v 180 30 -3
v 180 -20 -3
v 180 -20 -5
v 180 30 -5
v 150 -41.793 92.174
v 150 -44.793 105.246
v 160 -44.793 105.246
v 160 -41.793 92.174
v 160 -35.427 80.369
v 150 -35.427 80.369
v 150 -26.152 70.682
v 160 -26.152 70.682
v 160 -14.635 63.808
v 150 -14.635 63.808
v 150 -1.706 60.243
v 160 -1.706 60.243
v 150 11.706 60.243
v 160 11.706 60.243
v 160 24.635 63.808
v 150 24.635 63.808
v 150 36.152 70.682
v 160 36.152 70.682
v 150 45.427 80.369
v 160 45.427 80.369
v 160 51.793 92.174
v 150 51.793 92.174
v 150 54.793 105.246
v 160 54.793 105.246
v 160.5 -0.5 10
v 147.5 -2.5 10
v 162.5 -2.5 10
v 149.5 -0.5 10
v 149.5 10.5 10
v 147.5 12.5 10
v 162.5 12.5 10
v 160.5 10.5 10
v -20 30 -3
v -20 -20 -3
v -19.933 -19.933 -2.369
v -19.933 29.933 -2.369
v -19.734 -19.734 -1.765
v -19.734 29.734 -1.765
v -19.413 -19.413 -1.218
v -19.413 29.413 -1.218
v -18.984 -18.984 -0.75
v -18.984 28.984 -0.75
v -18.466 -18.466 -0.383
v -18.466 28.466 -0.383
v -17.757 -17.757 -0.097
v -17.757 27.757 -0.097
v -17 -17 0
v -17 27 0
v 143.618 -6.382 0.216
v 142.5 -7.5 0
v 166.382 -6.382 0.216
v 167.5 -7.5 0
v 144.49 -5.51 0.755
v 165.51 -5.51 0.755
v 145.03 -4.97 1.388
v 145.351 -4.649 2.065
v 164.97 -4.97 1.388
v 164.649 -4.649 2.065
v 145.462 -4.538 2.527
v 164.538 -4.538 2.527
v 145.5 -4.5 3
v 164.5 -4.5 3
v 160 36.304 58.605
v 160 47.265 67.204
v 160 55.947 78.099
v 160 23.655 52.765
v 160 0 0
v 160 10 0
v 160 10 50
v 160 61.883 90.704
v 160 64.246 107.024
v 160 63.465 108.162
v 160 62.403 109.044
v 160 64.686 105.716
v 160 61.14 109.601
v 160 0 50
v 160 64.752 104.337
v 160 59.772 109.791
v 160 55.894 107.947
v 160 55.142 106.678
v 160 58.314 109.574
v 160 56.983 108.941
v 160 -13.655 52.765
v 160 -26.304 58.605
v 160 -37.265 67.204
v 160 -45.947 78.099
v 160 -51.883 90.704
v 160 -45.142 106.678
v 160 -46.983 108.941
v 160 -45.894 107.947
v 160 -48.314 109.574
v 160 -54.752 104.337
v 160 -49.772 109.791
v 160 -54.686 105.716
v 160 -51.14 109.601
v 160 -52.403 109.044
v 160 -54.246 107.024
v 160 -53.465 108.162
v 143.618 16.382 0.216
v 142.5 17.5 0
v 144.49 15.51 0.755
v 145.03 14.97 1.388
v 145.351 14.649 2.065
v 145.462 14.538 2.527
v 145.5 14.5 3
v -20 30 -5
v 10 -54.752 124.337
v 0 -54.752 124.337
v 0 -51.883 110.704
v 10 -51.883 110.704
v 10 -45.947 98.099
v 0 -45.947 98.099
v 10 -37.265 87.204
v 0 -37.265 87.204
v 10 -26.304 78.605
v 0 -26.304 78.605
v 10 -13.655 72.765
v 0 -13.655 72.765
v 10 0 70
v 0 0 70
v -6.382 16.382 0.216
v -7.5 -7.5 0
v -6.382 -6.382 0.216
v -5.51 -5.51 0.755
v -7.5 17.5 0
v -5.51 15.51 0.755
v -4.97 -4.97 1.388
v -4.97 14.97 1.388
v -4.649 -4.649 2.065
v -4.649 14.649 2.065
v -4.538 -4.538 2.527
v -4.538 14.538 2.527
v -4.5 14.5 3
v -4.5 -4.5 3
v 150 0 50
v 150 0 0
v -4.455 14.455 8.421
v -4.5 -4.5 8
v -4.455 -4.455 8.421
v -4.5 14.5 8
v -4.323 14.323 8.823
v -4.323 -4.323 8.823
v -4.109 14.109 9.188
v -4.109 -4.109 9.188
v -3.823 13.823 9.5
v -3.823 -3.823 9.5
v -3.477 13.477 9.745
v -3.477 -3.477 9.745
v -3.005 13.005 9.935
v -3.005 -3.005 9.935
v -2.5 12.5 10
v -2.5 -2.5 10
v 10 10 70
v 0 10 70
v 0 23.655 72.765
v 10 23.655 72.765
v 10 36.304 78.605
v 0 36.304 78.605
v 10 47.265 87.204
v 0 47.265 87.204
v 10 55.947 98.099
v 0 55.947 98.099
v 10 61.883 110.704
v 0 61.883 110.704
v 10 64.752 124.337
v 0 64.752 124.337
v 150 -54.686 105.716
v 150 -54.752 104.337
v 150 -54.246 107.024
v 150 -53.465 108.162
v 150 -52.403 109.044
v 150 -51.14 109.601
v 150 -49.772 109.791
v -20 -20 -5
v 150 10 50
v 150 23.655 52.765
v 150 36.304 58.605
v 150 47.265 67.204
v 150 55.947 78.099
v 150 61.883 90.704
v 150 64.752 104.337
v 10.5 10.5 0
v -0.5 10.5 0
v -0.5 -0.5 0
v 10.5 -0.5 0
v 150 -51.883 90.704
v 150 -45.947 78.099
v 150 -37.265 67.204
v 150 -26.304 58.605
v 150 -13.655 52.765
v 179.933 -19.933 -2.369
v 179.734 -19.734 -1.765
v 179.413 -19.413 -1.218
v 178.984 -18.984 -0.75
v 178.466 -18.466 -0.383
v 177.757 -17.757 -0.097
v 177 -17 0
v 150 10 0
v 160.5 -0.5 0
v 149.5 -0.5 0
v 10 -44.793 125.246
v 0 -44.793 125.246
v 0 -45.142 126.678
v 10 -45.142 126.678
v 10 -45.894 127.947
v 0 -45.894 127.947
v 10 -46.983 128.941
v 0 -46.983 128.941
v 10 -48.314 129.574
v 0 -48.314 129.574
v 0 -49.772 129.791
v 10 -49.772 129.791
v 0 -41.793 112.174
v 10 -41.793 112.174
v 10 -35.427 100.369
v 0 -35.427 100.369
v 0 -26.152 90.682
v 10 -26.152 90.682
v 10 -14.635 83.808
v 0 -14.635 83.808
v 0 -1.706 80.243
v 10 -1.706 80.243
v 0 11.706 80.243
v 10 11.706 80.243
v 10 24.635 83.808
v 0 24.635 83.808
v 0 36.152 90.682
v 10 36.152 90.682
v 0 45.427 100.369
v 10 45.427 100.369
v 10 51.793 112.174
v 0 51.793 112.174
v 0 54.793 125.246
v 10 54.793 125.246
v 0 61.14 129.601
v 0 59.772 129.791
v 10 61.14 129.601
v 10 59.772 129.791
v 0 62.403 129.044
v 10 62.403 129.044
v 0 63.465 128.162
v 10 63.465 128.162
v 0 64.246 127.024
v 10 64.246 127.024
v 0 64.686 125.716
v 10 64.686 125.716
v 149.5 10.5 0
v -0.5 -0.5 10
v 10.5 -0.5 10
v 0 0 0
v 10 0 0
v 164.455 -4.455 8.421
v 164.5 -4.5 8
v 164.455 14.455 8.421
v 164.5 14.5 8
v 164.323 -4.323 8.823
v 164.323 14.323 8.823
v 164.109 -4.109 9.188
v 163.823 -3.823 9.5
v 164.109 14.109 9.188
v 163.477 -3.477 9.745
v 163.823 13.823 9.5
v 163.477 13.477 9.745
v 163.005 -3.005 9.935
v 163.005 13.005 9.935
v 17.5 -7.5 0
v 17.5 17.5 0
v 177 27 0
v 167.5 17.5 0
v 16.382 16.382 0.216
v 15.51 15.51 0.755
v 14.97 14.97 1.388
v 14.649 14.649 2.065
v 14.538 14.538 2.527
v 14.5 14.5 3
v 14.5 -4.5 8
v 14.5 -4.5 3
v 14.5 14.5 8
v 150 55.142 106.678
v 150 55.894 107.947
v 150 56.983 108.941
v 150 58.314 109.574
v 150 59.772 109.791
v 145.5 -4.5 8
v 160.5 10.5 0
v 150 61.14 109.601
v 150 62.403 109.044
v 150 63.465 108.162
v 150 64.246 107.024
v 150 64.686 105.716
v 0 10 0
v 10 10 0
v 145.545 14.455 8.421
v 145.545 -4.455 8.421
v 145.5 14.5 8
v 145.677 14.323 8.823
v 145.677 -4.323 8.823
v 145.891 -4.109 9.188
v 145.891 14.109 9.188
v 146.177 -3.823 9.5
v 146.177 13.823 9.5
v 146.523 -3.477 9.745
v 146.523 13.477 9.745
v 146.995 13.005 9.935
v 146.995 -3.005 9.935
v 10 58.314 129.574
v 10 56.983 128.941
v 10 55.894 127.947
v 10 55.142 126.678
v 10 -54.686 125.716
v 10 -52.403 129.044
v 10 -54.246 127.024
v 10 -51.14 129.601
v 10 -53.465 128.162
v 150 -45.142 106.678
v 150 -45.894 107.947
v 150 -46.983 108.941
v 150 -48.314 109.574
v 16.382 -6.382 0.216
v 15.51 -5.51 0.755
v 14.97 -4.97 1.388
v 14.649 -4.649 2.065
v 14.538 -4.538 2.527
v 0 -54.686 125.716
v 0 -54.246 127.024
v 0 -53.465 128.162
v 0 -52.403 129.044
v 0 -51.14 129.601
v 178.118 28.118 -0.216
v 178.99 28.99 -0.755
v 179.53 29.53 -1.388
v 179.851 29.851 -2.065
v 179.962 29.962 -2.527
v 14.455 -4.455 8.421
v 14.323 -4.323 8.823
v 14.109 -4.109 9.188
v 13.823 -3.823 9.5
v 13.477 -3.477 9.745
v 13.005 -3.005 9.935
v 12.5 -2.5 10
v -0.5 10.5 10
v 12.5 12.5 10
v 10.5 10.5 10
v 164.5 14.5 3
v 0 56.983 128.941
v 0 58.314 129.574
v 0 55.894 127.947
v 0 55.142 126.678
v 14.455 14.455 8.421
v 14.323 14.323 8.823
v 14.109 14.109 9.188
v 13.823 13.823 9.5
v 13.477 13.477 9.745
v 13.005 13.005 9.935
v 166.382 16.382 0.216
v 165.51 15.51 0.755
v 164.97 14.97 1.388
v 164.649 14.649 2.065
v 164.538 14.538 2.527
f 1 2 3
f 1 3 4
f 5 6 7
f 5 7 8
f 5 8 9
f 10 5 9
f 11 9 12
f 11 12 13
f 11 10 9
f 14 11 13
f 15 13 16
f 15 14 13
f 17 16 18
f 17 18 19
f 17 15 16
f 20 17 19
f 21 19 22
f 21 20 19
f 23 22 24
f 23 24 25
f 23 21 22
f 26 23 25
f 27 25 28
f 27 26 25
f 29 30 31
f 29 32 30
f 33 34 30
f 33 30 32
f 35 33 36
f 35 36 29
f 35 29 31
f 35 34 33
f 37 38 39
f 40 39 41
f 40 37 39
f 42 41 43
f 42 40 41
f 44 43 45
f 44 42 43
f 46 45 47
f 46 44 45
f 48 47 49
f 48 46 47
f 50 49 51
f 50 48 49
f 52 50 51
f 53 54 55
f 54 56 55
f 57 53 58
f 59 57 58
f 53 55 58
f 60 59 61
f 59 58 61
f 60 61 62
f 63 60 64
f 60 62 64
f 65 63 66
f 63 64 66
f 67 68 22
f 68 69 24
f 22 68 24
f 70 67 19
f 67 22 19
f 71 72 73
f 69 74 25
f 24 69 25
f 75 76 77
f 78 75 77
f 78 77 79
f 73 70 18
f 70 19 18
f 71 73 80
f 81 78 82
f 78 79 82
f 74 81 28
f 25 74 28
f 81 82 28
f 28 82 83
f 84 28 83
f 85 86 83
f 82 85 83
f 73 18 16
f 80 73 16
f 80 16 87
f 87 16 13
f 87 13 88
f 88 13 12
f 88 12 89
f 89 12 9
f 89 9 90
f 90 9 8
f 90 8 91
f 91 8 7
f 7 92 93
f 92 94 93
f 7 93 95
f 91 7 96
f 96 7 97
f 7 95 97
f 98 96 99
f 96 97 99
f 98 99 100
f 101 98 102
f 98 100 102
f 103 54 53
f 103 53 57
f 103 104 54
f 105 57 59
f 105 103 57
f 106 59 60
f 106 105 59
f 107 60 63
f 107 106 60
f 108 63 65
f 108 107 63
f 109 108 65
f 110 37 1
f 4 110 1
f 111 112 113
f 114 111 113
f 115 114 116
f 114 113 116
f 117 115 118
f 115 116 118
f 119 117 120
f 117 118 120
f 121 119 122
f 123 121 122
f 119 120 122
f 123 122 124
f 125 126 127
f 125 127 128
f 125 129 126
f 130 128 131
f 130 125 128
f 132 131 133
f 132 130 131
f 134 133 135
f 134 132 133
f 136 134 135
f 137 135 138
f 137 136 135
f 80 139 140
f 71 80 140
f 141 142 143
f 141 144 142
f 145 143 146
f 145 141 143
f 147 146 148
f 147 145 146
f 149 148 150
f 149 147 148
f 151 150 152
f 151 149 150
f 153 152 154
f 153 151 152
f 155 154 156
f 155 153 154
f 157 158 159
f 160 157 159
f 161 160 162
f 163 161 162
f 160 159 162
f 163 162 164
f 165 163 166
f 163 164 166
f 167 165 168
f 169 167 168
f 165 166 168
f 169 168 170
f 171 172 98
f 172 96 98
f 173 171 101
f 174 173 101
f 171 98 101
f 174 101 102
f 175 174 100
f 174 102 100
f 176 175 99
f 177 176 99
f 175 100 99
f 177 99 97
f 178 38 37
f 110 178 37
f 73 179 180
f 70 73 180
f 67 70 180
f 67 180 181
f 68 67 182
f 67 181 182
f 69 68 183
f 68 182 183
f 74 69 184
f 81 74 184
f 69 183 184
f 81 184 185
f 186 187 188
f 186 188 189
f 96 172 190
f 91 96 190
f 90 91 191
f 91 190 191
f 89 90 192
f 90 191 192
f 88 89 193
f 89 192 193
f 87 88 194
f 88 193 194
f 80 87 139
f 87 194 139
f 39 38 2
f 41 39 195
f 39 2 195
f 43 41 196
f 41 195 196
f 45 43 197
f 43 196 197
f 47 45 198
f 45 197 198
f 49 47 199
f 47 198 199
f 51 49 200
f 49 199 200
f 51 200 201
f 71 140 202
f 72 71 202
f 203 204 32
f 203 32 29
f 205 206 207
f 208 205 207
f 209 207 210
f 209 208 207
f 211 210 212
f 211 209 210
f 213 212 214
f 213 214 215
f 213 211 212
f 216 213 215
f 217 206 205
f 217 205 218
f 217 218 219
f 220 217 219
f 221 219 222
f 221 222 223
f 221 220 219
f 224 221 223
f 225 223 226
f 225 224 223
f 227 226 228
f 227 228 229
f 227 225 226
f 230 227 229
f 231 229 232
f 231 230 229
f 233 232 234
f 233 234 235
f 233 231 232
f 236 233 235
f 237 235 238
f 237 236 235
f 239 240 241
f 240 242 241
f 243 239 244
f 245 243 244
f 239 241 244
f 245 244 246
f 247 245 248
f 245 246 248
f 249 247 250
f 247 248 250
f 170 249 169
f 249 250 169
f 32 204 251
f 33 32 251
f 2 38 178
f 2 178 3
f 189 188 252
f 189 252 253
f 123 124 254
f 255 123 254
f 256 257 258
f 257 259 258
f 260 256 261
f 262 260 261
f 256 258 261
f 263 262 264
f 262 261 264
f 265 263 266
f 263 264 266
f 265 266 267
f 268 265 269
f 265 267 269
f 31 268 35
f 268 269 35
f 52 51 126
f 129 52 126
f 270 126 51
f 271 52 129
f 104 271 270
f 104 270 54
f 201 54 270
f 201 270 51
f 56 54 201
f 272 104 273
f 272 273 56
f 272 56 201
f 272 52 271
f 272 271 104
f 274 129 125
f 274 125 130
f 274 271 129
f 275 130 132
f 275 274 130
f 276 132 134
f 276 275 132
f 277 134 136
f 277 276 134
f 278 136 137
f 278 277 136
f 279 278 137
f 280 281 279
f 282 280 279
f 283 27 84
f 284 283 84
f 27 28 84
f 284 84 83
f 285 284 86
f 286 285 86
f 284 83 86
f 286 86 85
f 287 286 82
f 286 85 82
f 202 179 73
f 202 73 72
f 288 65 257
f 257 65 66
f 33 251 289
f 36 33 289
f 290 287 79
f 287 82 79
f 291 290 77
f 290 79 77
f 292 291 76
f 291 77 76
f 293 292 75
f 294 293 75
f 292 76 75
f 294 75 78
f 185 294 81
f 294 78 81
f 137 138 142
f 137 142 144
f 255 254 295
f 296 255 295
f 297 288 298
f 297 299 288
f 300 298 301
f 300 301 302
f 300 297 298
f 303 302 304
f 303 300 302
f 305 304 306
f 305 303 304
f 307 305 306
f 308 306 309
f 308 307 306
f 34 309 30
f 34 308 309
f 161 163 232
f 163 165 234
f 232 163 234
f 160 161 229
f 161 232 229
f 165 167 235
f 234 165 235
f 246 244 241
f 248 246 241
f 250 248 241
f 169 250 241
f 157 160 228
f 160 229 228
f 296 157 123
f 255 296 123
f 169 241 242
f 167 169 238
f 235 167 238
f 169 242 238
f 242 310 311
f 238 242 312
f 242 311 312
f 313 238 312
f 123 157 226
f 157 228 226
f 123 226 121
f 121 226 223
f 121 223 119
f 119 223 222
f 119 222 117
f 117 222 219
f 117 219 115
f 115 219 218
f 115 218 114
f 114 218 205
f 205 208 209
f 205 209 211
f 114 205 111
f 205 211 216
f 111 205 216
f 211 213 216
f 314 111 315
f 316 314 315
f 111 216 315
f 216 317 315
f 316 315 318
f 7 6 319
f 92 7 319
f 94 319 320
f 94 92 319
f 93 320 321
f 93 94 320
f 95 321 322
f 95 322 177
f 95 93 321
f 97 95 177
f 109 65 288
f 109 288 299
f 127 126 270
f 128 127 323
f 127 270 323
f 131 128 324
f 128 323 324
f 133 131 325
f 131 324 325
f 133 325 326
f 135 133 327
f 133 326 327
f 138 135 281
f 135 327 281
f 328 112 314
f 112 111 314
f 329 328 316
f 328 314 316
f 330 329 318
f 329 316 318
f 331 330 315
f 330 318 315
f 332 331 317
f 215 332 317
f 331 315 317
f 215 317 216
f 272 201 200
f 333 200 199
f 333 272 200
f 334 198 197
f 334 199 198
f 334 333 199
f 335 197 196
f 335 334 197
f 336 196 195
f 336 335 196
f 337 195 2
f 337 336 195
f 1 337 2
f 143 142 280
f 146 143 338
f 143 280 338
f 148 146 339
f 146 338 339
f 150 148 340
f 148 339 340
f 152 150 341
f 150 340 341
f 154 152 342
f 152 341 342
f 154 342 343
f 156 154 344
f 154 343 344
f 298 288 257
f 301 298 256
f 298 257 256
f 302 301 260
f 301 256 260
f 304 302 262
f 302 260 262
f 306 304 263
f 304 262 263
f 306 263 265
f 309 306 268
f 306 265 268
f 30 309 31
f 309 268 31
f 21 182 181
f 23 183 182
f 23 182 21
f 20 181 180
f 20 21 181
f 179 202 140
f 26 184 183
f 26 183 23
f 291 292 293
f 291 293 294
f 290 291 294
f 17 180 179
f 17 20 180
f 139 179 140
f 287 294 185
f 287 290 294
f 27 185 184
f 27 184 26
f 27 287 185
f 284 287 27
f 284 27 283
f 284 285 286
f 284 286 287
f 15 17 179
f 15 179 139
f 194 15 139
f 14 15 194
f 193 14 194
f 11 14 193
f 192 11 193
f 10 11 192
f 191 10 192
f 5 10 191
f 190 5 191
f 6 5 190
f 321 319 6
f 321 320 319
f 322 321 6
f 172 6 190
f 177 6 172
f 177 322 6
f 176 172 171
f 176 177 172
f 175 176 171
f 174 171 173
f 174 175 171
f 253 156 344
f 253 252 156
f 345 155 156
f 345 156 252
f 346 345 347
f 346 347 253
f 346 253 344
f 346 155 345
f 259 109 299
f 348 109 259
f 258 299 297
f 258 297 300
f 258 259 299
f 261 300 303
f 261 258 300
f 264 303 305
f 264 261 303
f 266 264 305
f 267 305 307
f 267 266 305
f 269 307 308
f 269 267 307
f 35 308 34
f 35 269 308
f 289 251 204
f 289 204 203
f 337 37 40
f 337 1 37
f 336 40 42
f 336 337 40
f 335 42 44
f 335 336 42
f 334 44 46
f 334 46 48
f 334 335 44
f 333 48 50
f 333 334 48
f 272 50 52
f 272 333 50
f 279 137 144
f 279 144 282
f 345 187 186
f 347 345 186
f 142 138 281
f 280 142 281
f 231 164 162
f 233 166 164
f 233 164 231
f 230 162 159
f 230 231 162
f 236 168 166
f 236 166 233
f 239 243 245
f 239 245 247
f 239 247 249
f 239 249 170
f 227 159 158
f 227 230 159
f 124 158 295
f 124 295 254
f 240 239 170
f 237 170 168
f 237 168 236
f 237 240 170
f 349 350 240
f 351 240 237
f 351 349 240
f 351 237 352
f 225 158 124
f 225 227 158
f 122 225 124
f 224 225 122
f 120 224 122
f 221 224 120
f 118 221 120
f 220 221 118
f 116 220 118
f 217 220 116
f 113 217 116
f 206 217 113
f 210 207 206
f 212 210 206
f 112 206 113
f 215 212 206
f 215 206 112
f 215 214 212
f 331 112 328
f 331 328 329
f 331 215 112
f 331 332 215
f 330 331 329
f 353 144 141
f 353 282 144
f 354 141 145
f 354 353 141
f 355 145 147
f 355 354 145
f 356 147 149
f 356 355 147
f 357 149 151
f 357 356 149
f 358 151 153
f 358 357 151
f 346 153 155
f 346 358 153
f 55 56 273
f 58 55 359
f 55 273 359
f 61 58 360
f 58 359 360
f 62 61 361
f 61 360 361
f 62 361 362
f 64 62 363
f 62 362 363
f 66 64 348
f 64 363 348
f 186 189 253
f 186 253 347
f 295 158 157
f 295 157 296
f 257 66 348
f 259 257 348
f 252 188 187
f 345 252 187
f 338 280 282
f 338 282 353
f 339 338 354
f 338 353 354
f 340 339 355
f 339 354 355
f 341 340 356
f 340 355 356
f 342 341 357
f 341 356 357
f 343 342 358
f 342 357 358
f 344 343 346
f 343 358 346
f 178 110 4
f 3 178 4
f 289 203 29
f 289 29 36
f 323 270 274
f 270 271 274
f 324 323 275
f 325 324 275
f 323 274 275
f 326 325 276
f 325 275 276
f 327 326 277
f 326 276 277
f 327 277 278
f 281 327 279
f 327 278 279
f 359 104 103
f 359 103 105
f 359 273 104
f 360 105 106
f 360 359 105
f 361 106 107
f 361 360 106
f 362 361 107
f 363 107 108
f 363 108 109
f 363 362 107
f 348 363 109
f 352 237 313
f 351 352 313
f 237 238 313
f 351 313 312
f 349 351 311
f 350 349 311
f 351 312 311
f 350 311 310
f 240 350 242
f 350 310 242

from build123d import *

# Parameters (mm, degrees)
PAD_DEPTH           = 10
FILLET_R            = 4.9999
SKETCH002_W         = 19
SKETCH002_H         = 19
SKETCH002_W_2       = 11
SKETCH002_H_2       = 11
PAD001_DEPTH        = 10
SKETCH001_W         = 200
SKETCH001_H         = 50
PAD002_DEPTH        = 5
LINEARPATTERN_COUNT = 2
LINEARPATTERN_PITCH = 150
FILLET001_R         = 3
FILLET002_R         = 2
PAD003_DEPTH        = 10
FILLET003_R         = 4.9999


with BuildPart() as stand_left:
    # Sketch → Pad (new body)
    with BuildSketch(Plane.YZ):
        with BuildLine():
            ThreePointArc((-45, 129.791304), (5, 79.791304), (55, 129.791304))
            Line((55, 129.791304), (65, 129.791304))
            ThreePointArc((10, 70), (49.158804, 89.171112), (65, 129.791304))
            Line((10, 70), (10, 0))
            Line((0, 0), (10, 0))
            Line((0, 70), (0, 0))
            ThreePointArc((-55, 129.791304), (-39.158804, 89.171112), (0, 70))
            Line((-55, 129.791304), (-45, 129.791304))
        make_face()
    extrude(amount=PAD_DEPTH)

    # Fillet
    fillet_edges = [stand_left.edges().sort_by_distance(p)[0] for p in [
        (5, 55, 129.791304),
        (5, 65, 129.791304),
        (5, -55, 129.791304),
        (5, -45, 129.791304),
    ]]
    fillet(fillet_edges, radius=FILLET_R)


with BuildPart() as base:
    # Sketch002 → Pad001 (new body)
    with BuildSketch(Plane.XY):
        with Locations((5, 5)):
            Rectangle(SKETCH002_W, SKETCH002_H)
        with Locations((5, 5)):
            Rectangle(SKETCH002_W_2, SKETCH002_H_2, mode=Mode.SUBTRACT)
    pad001 = extrude(amount=PAD001_DEPTH)

    # Sketch001 → Pad002 (join)
    with BuildSketch(Plane.XY):
        with Locations((80, 5)):
            Rectangle(SKETCH001_W, SKETCH001_H)
    extrude(amount=-PAD002_DEPTH)

    # LinearPattern: Pad001 ×2
    with Locations(*[(i * LINEARPATTERN_PITCH, 0, 0) for i in range(1, LINEARPATTERN_COUNT)]):
        add(pad001)

    # Fillet001
    fillet001_edges = [base.edges().sort_by_distance(p)[0] for p in [
        (80, -20, 0),
        (-20, 5, 0),
        (180, 5, 0),
        (80, 30, 0),
        (-4.5, 5, 0),
        (5, -4.5, 0),
        (5, 14.5, 0),
        (14.5, 5, 0),
        (145.5, 5, 0),
        (155, -4.5, 0),
        (164.5, 5, 0),
        (155, 14.5, 0),
    ]]
    fillet(fillet001_edges, radius=FILLET001_R)

    # Fillet002
    fillet002_edges = [base.edges().sort_by_distance(p)[0] for p in [
        (-4.5, 5, 10),
        (5, 14.5, 10),
        (14.5, 5, 10),
        (5, -4.5, 10),
        (155, 14.5, 10),
        (164.5, 5, 10),
        (155, -4.5, 10),
        (145.5, 5, 10),
    ]]
    fillet(fillet002_edges, radius=FILLET002_R)


with BuildPart() as stand_right:
    # Sketch003 → Pad003 (new body)
    with BuildSketch(Plane.YZ.offset(150)):
        with BuildLine():
            ThreePointArc((-45, 109.791304), (5, 59.791304), (55, 109.791304))
            Line((55, 109.791304), (65, 109.791304))
            ThreePointArc((10, 50), (49.158804, 69.171112), (65, 109.791304))
            Line((10, 50), (10, 0))
            Line((0, 0), (10, 0))
            Line((0, 50), (0, 0))
            ThreePointArc((-55, 109.791304), (-39.158804, 69.171112), (0, 50))
            Line((-55, 109.791304), (-45, 109.791304))
        make_face()
    extrude(amount=PAD003_DEPTH)

    # Fillet003
    fillet003_edges = [stand_right.edges().sort_by_distance(p)[0] for p in [
        (155, 55, 109.791304),
        (155, 65, 109.791304),
        (155, -55, 109.791304),
        (155, -45, 109.791304),
    ]]
    fillet(fillet003_edges, radius=FILLET003_R)


solid = Compound([stand_left.part, base.part, stand_right.part])
